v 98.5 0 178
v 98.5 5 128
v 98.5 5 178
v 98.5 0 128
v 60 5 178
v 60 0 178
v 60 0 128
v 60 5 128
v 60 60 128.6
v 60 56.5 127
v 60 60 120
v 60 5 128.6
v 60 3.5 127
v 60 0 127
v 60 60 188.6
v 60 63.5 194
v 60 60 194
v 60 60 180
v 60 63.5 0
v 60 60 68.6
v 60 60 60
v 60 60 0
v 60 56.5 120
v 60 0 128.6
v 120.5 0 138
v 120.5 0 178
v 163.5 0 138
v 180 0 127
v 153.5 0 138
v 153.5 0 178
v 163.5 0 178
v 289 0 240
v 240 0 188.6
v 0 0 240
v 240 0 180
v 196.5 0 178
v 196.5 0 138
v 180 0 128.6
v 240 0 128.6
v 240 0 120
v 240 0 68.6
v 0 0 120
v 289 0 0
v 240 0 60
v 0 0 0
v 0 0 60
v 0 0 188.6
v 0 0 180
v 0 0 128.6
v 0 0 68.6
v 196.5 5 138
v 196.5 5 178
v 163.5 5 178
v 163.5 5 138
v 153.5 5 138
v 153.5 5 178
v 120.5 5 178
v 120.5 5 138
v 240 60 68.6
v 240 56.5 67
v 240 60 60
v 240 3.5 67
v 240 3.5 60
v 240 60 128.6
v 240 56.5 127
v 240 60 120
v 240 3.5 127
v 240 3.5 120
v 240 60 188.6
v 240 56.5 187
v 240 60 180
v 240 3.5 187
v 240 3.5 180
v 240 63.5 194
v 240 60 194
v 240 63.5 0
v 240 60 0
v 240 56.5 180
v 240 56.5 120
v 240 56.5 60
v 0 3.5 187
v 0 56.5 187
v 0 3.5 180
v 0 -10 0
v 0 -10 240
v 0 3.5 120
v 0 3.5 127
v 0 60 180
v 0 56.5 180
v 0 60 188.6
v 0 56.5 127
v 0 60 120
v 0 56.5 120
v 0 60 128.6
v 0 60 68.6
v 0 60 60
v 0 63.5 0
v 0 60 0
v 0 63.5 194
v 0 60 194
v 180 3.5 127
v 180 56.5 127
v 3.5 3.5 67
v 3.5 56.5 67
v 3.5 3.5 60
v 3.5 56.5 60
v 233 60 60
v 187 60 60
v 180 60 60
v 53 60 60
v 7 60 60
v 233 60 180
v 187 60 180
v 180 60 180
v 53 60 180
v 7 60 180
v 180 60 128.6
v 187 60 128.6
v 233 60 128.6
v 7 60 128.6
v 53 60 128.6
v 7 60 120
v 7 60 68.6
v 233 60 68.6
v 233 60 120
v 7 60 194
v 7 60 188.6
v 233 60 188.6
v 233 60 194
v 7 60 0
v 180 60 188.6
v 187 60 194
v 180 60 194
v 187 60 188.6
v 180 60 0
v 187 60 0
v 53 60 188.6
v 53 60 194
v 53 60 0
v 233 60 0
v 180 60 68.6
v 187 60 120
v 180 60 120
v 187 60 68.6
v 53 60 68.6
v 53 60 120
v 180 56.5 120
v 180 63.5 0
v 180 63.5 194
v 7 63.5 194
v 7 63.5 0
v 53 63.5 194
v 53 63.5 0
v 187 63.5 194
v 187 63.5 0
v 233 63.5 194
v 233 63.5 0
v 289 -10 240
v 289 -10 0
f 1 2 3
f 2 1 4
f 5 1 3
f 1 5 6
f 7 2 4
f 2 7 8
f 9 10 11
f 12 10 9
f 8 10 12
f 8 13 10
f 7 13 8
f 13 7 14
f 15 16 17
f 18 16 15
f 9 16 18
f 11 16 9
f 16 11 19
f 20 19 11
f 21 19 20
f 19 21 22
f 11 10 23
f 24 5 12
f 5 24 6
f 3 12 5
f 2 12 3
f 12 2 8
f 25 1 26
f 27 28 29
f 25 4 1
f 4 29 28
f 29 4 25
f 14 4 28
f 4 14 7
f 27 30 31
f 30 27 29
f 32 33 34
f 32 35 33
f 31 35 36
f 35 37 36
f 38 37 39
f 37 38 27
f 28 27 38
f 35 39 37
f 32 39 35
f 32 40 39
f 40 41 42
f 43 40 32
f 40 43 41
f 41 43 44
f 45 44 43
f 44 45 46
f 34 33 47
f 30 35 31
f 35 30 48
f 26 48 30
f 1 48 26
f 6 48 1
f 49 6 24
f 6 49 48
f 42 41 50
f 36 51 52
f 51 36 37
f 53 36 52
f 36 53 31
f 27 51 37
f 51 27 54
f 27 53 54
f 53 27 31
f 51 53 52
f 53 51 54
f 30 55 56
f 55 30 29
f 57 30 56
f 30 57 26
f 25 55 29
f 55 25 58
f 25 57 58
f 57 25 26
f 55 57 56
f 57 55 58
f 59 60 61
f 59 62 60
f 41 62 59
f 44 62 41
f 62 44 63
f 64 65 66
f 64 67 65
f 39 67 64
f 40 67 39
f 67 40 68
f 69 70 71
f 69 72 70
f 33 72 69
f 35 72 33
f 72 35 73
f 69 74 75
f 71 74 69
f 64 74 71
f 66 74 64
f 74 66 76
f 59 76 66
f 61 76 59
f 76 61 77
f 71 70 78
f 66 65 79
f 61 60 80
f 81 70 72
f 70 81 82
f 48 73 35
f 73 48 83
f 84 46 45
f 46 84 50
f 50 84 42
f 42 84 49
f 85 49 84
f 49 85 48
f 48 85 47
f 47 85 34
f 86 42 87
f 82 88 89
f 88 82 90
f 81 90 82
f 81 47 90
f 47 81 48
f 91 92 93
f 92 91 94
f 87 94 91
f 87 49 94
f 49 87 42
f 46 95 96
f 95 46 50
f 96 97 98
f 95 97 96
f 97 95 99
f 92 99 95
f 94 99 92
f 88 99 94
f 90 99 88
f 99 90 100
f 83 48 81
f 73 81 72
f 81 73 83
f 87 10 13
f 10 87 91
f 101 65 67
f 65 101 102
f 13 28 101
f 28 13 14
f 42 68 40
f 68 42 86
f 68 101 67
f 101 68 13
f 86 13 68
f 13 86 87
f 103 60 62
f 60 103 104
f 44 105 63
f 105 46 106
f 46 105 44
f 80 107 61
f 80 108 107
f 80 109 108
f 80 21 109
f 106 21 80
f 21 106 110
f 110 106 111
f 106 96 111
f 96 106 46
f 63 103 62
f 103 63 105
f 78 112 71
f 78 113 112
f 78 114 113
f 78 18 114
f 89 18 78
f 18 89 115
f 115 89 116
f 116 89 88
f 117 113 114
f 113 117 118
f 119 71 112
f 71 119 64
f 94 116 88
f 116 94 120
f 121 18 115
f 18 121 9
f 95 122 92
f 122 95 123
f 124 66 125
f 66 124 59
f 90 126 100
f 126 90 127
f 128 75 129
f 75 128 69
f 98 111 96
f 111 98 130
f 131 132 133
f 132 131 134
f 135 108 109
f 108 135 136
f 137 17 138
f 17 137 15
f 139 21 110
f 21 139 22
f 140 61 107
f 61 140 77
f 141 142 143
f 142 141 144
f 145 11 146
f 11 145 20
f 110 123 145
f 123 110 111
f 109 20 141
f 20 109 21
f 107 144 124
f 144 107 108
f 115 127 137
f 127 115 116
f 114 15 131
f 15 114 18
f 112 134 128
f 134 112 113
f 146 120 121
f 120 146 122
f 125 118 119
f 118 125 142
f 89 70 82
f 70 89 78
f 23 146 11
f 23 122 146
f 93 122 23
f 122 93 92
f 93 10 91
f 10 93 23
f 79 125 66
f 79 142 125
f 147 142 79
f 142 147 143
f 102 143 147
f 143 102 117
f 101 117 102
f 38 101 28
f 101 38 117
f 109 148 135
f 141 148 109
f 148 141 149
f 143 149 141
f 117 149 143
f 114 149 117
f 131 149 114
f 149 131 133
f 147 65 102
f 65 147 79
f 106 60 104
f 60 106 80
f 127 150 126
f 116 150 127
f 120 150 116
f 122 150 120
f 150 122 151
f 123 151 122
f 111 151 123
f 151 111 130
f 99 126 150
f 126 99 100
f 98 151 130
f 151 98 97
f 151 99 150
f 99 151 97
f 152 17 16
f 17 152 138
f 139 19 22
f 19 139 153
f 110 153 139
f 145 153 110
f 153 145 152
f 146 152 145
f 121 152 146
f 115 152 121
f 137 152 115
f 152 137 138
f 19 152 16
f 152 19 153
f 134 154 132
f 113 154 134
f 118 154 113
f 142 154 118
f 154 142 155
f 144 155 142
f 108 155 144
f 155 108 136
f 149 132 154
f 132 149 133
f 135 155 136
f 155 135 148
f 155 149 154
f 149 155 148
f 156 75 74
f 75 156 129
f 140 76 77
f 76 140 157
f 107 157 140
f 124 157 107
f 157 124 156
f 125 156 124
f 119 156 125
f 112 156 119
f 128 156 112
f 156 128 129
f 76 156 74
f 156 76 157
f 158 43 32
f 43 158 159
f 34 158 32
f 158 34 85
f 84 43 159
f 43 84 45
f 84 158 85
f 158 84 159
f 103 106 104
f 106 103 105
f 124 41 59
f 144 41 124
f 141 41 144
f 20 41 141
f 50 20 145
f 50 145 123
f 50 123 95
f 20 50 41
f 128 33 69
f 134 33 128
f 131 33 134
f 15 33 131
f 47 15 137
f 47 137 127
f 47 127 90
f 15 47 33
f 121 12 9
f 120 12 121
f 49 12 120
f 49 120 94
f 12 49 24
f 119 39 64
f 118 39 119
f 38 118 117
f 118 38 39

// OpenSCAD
//unit: cm

ceiling_height = 272;
wall_width = 289;
wall_height = 240;

size_a = 7;
size_b = 3.5;

layer_1_z = 60;
layer_2_z = 120;
layer_3_z = 180;

panel_width = 60;
support_length = panel_width - size_b * 2;
echo(support_length=support_length);

shelf_top_extra = size_a; // TODO
shelf_height = layer_3_z + size_a + shelf_top_extra;
echo(shelf_height=shelf_height);

shelf_width = 240;  // good for ply wood 120 x 60

ebox_large_x = 60;
ebox_large_h = 50;
ebox_large_w = 38.5;
ebox_large_z = 128;
ebox_top_z = ebox_large_z + ebox_large_h; // 178

ebox_offset = 92.5;
ebox_w = 33;
ebox_h = 40;
ebox_z = 140;

side_grid_with = 60;
column_1_x = side_grid_with - size_a;
column_2_x = shelf_width - side_grid_with;

module person() {
    color("purple") translate([shelf_width/2, panel_width + 30, 0]) cylinder(r=20, h=165);
}

module layer_1_panel() {
    color("white") translate([0,0,layer_1_z + size_a]) cube([shelf_width, panel_width, 1.6]);
}

module layer_3_panel() {
    color("white") translate([0,0,layer_3_z + size_a]) cube([shelf_width, panel_width, 1.6]);
}

module layer_2_panel_1() {
    color("white") translate([0,0,layer_2_z + size_a]) cube([side_grid_with, panel_width, 1.6]);
}

module layer_2_panel_2() {
    color("white") translate([column_2_x,0,layer_2_z + size_a]) cube([side_grid_with, panel_width, 1.6]);
}

module wall() {
    translate([0,-10,0]) cube([wall_width, 10, wall_height]);
}

module ebox_large() {
    translate([ebox_large_x, 0, ebox_top_z - ebox_large_h]) cube([ebox_large_w, 5, ebox_large_h]);
}

module ebox_small_1() {
    translate([wall_width - ebox_offset - ebox_w, 0, ebox_top_z - ebox_h]) cube([ebox_w, 5, ebox_h]);
}

module ebox_small_2() {
    translate([-(ebox_w+10),0,0]) ebox_small_1();
}

module row(width=shelf_width) {
    cube([width, size_b, size_a]);
}

module rows_back() {
    translate([0, 0, layer_3_z]) row();
    translate([0, 0, layer_2_z]) row();
    translate([0, 0, layer_1_z]) row();
}

module rows_front() {
    translate([0, panel_width-size_b, layer_3_z]) row();
    translate([0, panel_width-size_b, layer_2_z]) row(width=side_grid_with);
    translate([column_2_x, panel_width-size_b, layer_2_z]) row(width=side_grid_with);
    translate([0, panel_width-size_b, layer_1_z]) row();
}

module column() {
    color("red") translate([0, size_b * 2 + support_length]) cube([size_a, size_b, shelf_height]);
}

module columns() {
    column();
    translate([column_1_x, 0, 0]) column();
    translate([column_2_x, 0, 0]) column();
    translate([shelf_width - size_a, 0, 0]) column();
}

module support() {
    translate([0, size_b, layer_1_z]) cube([size_b, support_length, size_a]);
}

module layer_1_supports() {
    support();
}


wall();
//person();

color("white") {
    ebox_large();
    ebox_small_1();
    ebox_small_2();
}

color("blue") rows_back();
color("yellow") rows_front();

columns();
support();
layer_1_panel();
layer_3_panel();
layer_2_panel_1();
layer_2_panel_2();
